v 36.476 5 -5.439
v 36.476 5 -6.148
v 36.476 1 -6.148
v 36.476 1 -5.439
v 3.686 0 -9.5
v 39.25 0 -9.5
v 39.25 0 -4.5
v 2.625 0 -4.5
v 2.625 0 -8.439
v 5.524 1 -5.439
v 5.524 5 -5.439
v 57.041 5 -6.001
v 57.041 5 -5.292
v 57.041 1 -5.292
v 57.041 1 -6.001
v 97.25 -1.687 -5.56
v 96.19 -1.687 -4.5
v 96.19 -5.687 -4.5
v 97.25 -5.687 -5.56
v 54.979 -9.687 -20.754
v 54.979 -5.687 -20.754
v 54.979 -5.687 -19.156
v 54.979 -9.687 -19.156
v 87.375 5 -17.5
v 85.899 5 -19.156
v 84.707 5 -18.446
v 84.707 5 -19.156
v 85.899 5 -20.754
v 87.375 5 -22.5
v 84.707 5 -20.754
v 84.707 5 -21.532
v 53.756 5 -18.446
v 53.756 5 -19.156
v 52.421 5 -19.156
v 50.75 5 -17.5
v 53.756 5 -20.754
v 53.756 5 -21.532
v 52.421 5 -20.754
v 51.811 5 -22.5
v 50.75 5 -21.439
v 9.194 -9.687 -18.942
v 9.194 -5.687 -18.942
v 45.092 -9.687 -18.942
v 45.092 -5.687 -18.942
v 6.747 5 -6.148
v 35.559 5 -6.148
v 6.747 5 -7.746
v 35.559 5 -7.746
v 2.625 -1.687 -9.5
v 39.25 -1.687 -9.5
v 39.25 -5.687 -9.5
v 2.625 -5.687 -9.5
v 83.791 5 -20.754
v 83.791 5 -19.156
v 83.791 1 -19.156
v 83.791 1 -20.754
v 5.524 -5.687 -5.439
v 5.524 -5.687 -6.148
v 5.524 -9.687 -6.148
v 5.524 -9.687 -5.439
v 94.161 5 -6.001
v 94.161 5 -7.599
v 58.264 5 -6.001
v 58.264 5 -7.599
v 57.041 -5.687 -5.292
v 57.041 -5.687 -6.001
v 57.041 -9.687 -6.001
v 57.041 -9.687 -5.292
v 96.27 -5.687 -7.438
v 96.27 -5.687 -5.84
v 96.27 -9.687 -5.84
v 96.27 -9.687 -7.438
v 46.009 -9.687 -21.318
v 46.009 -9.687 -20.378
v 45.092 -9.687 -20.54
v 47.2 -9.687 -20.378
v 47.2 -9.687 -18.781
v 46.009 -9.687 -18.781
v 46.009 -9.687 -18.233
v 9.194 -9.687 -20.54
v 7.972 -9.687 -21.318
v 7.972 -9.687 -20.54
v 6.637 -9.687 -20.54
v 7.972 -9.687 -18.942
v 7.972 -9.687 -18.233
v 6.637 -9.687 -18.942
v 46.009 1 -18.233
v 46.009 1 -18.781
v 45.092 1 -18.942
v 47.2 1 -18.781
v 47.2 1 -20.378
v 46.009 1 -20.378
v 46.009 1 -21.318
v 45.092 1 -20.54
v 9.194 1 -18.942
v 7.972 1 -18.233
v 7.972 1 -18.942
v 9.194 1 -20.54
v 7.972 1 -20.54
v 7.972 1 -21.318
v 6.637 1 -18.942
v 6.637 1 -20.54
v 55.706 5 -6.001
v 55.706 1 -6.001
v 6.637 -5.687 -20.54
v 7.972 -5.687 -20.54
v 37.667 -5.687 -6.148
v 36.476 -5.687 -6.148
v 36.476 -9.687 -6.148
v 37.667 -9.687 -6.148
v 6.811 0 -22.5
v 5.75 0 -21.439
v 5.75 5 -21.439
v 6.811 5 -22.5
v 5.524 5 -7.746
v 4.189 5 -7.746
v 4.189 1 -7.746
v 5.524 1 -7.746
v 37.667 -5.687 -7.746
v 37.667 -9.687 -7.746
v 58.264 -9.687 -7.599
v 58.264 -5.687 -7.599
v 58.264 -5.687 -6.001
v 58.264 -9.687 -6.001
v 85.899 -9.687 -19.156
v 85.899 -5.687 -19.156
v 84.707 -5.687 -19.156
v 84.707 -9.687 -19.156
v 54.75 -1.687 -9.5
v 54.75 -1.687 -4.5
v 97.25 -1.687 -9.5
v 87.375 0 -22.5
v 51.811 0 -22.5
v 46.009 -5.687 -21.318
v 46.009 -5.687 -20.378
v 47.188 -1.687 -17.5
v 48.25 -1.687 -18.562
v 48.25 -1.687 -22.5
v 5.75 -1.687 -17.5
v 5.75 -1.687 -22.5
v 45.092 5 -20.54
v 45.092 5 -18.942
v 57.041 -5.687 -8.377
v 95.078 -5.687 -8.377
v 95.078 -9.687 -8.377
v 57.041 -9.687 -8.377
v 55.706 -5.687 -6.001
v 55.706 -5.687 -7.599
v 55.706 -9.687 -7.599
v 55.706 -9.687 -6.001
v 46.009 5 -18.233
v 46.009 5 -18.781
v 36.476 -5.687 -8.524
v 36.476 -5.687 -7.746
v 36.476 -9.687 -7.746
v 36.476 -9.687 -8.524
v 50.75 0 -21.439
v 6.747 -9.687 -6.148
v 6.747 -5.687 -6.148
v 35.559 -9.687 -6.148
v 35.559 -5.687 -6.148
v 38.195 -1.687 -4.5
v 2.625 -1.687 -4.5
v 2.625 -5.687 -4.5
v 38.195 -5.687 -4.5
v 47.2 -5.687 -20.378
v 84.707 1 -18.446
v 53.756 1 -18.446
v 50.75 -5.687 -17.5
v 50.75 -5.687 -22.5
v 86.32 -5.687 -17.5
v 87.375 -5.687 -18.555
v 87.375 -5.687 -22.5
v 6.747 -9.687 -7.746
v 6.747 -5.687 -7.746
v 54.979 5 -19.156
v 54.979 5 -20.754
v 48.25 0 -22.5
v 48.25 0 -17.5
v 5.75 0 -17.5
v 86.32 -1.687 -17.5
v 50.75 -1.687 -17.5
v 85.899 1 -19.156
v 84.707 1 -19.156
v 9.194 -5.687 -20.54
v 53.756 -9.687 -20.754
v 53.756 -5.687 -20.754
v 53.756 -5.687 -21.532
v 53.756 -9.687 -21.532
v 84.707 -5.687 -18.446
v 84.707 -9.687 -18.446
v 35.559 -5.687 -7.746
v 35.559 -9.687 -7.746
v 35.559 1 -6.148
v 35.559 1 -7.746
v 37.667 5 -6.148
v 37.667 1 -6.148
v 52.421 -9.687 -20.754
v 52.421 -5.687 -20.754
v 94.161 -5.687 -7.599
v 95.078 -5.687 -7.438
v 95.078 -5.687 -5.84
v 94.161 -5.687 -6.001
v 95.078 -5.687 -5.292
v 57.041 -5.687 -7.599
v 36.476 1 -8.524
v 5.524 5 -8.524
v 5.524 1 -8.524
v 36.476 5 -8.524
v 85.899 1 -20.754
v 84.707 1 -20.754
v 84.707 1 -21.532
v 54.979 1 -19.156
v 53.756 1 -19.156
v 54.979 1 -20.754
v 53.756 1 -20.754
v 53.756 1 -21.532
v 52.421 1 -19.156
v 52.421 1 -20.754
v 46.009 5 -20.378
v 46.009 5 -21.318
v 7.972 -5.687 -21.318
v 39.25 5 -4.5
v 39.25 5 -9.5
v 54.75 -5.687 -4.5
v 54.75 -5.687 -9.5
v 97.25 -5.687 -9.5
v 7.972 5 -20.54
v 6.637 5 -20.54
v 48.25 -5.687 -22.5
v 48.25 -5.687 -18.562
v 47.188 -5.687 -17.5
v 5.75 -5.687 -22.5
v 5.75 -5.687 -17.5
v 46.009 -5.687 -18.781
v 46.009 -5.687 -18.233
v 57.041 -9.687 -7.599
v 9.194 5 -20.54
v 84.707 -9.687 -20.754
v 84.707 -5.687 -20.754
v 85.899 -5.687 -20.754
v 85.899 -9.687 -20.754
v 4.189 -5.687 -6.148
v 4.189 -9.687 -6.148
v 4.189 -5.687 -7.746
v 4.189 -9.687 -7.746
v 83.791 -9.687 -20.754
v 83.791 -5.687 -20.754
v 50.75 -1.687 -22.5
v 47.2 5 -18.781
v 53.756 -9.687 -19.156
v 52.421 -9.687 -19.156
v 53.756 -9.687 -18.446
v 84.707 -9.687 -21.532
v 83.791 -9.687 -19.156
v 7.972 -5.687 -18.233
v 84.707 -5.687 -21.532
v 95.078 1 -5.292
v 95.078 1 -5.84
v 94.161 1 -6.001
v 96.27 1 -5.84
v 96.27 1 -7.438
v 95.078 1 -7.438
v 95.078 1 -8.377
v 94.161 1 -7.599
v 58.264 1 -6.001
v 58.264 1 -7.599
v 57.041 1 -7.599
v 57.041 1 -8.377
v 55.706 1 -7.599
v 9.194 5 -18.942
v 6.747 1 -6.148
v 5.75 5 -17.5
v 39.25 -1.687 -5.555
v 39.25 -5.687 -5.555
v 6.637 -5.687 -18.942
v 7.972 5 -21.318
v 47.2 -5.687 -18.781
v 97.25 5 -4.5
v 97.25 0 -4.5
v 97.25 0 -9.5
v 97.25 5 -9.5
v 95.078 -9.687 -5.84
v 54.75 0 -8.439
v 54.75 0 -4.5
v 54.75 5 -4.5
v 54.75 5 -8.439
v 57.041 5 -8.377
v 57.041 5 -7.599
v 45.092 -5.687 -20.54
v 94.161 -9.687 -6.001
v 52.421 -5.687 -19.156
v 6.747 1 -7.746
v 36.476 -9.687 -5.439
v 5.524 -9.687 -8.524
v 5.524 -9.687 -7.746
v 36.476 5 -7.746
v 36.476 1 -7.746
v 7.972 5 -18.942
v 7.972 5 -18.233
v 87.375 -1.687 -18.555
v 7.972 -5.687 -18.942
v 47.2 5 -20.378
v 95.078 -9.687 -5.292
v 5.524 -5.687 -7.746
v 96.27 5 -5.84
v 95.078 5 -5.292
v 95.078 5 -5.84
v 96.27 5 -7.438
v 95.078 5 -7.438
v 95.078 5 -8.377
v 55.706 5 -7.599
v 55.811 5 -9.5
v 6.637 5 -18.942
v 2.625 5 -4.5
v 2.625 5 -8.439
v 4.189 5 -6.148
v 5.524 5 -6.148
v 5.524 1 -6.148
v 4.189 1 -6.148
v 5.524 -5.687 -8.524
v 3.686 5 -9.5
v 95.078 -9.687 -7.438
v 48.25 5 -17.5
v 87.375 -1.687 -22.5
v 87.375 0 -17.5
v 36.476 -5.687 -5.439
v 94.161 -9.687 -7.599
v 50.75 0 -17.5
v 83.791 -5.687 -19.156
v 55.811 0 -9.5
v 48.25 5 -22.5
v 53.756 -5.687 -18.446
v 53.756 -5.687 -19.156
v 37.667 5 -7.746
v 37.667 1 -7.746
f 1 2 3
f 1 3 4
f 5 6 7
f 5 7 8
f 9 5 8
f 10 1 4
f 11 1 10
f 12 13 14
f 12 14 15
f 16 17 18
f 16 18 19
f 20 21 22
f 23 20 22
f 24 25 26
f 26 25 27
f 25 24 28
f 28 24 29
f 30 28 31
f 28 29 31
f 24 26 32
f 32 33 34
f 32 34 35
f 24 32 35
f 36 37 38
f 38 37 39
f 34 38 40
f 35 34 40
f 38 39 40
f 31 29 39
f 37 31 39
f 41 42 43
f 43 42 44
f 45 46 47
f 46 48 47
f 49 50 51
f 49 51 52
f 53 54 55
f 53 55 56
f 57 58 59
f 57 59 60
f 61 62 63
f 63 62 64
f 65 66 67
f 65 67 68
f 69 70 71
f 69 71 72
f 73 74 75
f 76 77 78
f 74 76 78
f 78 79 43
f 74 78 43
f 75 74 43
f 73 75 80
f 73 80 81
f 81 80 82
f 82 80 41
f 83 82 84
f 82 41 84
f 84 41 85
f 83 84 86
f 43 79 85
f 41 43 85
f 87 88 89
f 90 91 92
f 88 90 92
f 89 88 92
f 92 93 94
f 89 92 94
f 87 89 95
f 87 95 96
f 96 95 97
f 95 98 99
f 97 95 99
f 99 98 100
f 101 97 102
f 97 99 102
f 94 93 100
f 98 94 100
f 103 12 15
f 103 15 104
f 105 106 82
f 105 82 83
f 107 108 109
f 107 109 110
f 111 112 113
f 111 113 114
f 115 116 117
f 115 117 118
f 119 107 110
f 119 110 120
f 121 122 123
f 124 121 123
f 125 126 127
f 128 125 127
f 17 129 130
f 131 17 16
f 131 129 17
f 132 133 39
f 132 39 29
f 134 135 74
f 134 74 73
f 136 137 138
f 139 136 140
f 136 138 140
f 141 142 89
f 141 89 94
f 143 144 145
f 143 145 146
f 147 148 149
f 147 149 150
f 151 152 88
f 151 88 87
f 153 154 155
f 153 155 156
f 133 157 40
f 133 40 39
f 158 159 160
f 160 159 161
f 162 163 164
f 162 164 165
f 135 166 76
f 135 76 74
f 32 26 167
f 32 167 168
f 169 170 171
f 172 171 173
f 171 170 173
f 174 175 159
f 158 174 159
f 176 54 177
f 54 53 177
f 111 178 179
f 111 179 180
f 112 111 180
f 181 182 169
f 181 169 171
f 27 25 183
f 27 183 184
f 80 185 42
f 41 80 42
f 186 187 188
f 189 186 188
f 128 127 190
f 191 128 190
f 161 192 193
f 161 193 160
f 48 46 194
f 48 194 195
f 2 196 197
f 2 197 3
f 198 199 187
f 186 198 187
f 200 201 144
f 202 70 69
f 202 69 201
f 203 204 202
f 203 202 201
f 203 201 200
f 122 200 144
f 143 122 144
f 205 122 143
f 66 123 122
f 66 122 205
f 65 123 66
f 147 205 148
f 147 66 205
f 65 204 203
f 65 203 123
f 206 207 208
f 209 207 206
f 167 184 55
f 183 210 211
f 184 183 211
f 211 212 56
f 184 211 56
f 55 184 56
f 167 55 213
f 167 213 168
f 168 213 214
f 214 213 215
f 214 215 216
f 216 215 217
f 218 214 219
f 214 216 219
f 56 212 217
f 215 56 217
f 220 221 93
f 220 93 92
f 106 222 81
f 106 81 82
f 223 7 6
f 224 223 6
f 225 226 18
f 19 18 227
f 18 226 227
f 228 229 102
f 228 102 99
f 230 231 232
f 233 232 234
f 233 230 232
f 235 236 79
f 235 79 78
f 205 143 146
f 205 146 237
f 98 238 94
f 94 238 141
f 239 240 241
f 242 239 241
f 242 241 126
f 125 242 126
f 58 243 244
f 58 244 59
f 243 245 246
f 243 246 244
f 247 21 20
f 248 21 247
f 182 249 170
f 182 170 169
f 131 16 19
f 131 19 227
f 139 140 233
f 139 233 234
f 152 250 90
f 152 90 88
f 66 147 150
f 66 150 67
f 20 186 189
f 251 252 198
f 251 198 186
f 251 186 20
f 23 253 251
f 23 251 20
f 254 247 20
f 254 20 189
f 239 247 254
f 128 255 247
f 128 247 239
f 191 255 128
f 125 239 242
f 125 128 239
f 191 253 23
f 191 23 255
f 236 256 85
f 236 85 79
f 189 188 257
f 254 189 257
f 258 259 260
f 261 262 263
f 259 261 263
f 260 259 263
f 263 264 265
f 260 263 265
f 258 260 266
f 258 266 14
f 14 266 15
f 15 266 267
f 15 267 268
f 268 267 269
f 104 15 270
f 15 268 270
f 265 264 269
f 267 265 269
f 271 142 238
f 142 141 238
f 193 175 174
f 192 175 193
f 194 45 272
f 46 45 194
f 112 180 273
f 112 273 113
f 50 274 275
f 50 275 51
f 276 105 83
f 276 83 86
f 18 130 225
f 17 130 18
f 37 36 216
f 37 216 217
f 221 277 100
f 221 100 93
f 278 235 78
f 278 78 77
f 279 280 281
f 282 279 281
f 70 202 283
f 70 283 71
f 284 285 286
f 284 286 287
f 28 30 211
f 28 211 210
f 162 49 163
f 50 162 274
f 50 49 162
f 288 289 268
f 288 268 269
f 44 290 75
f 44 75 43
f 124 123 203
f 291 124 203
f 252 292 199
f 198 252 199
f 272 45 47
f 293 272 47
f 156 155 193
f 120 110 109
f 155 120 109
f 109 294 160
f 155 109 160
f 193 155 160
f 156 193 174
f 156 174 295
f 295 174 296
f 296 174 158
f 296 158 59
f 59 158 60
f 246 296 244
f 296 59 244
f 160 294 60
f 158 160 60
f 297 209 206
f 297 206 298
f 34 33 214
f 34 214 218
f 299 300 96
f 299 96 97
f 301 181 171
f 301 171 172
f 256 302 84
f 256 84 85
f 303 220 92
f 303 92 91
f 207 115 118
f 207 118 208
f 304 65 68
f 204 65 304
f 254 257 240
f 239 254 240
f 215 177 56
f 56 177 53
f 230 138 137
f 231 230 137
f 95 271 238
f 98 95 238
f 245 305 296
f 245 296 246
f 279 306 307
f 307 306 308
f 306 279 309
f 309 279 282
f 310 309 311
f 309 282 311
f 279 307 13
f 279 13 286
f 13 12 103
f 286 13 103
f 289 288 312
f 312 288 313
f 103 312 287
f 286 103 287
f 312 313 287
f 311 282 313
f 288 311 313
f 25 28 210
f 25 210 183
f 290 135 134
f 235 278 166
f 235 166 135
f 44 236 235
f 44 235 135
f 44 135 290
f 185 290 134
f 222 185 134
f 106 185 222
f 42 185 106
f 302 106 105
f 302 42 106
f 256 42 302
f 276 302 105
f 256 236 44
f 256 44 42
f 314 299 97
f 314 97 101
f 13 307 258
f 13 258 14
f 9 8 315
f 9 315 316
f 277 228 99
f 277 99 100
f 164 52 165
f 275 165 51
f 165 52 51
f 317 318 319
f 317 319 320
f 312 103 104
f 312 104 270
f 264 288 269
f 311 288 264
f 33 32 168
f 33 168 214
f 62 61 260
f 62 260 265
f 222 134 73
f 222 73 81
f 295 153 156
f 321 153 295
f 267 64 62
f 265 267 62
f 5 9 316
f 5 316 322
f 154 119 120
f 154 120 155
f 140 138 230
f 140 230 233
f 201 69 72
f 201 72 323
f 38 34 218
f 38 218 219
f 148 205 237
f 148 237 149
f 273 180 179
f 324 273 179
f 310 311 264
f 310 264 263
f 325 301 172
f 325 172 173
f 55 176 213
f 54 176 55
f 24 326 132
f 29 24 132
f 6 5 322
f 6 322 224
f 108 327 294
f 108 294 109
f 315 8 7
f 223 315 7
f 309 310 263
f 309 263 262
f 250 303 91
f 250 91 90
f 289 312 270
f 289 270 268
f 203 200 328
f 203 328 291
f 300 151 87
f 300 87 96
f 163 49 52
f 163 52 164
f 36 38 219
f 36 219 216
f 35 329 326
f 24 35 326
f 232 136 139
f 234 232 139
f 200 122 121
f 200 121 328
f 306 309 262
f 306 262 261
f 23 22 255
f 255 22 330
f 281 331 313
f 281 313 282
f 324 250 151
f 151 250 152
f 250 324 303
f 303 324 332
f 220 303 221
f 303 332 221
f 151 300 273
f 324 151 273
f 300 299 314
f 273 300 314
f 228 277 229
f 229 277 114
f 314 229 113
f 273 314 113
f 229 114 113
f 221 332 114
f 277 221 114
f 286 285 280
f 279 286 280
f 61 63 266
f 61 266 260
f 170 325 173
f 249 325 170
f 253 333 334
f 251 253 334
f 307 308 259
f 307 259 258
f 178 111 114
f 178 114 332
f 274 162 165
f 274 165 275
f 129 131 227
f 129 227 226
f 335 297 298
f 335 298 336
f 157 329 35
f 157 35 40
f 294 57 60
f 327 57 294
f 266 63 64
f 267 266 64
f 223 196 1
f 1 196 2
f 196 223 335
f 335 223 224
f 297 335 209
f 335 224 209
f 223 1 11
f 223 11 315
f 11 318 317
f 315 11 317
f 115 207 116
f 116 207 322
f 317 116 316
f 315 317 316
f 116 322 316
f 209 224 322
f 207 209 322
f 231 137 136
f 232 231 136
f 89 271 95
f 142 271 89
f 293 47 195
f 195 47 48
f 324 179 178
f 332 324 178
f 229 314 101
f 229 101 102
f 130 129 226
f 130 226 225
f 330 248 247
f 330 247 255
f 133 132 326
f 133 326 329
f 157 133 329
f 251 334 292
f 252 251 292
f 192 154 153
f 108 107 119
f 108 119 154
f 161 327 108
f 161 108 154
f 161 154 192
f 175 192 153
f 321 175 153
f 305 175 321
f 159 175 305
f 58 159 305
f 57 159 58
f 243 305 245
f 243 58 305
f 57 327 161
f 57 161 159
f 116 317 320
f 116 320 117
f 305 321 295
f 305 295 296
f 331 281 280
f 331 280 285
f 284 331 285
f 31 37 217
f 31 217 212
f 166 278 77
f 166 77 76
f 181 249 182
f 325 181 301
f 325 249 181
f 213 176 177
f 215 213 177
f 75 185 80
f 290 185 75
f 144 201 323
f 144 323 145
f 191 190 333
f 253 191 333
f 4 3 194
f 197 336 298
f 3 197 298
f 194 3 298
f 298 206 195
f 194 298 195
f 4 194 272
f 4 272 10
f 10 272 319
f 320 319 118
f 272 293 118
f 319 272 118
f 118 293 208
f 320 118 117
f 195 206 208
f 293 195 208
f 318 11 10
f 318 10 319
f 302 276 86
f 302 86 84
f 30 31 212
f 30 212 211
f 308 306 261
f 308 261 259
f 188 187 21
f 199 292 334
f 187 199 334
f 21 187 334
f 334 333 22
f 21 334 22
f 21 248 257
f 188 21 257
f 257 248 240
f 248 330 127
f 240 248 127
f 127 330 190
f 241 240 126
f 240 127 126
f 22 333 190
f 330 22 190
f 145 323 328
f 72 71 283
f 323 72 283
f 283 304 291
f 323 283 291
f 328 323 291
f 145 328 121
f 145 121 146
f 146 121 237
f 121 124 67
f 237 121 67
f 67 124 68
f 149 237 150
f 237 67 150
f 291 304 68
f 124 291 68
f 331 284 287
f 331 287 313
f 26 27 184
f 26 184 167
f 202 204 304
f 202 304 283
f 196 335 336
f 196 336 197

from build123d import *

# Parameters (mm, degrees)
SV_DEPTH           = 5
SV_2_DEPTH         = 5
SV_3_DEPTH         = 5
SV_4_DEPTH         = 5
SKETCH3_W          = 28.811718275
SKETCH3_H          = 1.597828601
SKETCH3_W_2        = 35.897762959
SKETCH3_W_3        = 35.897762958
CUT_EXTRUDE1_DEPTH = 4
SV4_A_DEPTH        = 4
SV4_A_2_DEPTH      = 4
SV4_A_3_DEPTH      = 4
SV4_A_4_DEPTH      = 4
SKETCH7_W          = 35.897762958
SKETCH7_H          = 1.597828601
SV4_B_DEPTH        = 4
SKETCH7_W_2        = 28.811718275
SV4_B_2_DEPTH      = 4
SKETCH7_W_3        = 35.897762959
SV4_B_3_DEPTH      = 4
SV4_B_4_DEPTH      = 4


with BuildPart() as part:
    # Sketch1 → SV (new body)
    with BuildSketch(Plane(origin=(0, 0, 0), x_dir=(1, 0, 0), z_dir=(0, 1, 0))):
        Polygon((55.811, 9.5), (97.25, 9.5), (97.25, 5.56), (97.25, 4.5), (96.19, 4.5), (54.75, 4.5), (54.75, 8.439), align=None)
    extrude(amount=SV_DEPTH)


with BuildPart() as body_2:
    # Sketch1 → SV 2 (new body)
    with BuildSketch(Plane(origin=(0, 0, 0), x_dir=(1, 0, 0), z_dir=(0, 1, 0))):
        Polygon((3.686, 9.5), (39.25, 9.5), (39.25, 5.555), (39.25, 4.5), (38.195, 4.5), (2.625, 4.5), (2.625, 8.439), align=None)
    extrude(amount=SV_2_DEPTH)


with BuildPart() as body_3:
    # Sketch1 → SV 3 (new body)
    with BuildSketch(Plane(origin=(0, 0, 0), x_dir=(1, 0, 0), z_dir=(0, 1, 0))):
        Polygon((51.811, 22.5), (87.375, 22.5), (87.375, 18.555), (87.375, 17.5), (86.32, 17.5), (50.75, 17.5), (50.75, 21.439), align=None)
    extrude(amount=SV_3_DEPTH)


with BuildPart() as body_4:
    # Sketch1 → SV 4 (new body)
    with BuildSketch(Plane(origin=(0, 0, 0), x_dir=(1, 0, 0), z_dir=(0, 1, 0))):
        Polygon((6.811, 22.5), (48.25, 22.5), (48.25, 18.56), (48.25, 17.5), (47.19, 17.5), (5.75, 17.5), (5.75, 21.439), align=None)
    extrude(amount=SV_4_DEPTH)


with BuildPart() as cut_extrude1_tool:
    # Sketch3 → Cut-Extrude1 (new body)
    # profile 1 of 4: a face of its own
    with BuildSketch(Plane(origin=(0, 5, 0), x_dir=(1, 0, 0), z_dir=(0, 1, 0))):
        Polygon((4.189336253, 7.745735487), (5.524337048, 7.745735487), (5.524337048, 8.524173538), (36.475691419, 8.524173538), (36.475691419, 7.745735487), (37.666991912, 7.745735487), (37.666991912, 6.147906886), (36.475691419, 6.147906886), (36.475691419, 5.438560322), (5.524337048, 5.438560322), (5.524337048, 6.147906886), (4.189336253, 6.147906886), align=None)
        with Locations((21.152985591, 6.946821187)):
            Rectangle(SKETCH3_W, SKETCH3_H, mode=Mode.SUBTRACT)
    # profile 2 of 4: a face of its own
    with BuildSketch(Plane(origin=(0, 5, 0), x_dir=(1, 0, 0), z_dir=(0, 1, 0))):
        Polygon((52.421116037, 20.753597434), (53.756116831, 20.753597434), (53.756116831, 21.532035485), (84.707471203, 21.532035485), (84.707471203, 20.753597434), (85.898771695, 20.753597434), (85.898771695, 19.155768833), (84.707471203, 19.155768833), (84.707471203, 18.446422269), (53.756116831, 18.446422269), (53.756116831, 19.155768833), (52.421116037, 19.155768833), align=None)
        with Locations((69.384765375, 19.954683133)):
            Rectangle(SKETCH3_W, SKETCH3_H, mode=Mode.SUBTRACT)
    # profile 3 of 4: a face of its own
    with BuildSketch(Plane(origin=(0, 5, 0), x_dir=(1, 0, 0), z_dir=(0, 1, 0))):
        Polygon((55.705906871, 7.599031898), (57.040907666, 7.599031898), (57.040907666, 8.377469948), (95.07830672, 8.377469948), (95.07830672, 7.437727621), (96.269607213, 7.437727621), (96.269607213, 5.83989902), (95.07830672, 5.83989902), (95.07830672, 5.291856733), (57.040907666, 5.291856733), (57.040907666, 6.001203297), (55.705906871, 6.001203297), align=None)
        with Locations((76.21257855, 6.800117597)):
            Rectangle(SKETCH3_W_2, SKETCH3_H, mode=Mode.SUBTRACT)
    # profile 4 of 4: a face of its own
    with BuildSketch(Plane(origin=(0, 5, 0), x_dir=(1, 0, 0), z_dir=(0, 1, 0))):
        Polygon((6.636601859, 20.53972103), (7.971602653, 20.53972103), (7.971602653, 21.318159081), (46.009001708, 21.318159081), (46.009001708, 20.378416754), (47.2003022, 20.378416754), (47.2003022, 18.780588153), (46.009001708, 18.780588153), (46.009001708, 18.232545866), (7.971602653, 18.232545866), (7.971602653, 18.941892429), (6.636601859, 18.941892429), align=None)
        with Locations((27.143273538, 19.74080673)):
            Rectangle(SKETCH3_W_3, SKETCH3_H, mode=Mode.SUBTRACT)
    extrude(amount=-CUT_EXTRUDE1_DEPTH)


with BuildPart() as part_1:
    add(part.part)

    # Cut-Extrude1: cut by cut_extrude1_tool
    add(cut_extrude1_tool.part, mode=Mode.SUBTRACT)


with BuildPart() as body_2_1:
    add(body_2.part)

    # Cut-Extrude1: cut by cut_extrude1_tool
    add(cut_extrude1_tool.part, mode=Mode.SUBTRACT)


with BuildPart() as body_3_1:
    add(body_3.part)

    # Cut-Extrude1: cut by cut_extrude1_tool
    add(cut_extrude1_tool.part, mode=Mode.SUBTRACT)


with BuildPart() as body_4_1:
    add(body_4.part)

    # Cut-Extrude1: cut by cut_extrude1_tool
    add(cut_extrude1_tool.part, mode=Mode.SUBTRACT)


with BuildPart() as body_5:
    # Sketch6 → SV4(a) (new body)
    with BuildSketch(Plane(origin=(0, -1.68656, 0), x_dir=(1, 0, 0), z_dir=(0, 1, 0))):
        Polygon((2.625, 4.5), (38.195, 4.5), (39.25, 5.555), (39.25, 9.5), (3.685, 9.5), (2.625, 9.5), (2.625, 8.44), align=None)
    extrude(amount=-SV4_A_DEPTH)


with BuildPart() as body_6:
    # Sketch6 → SV4_a 2 (new body)
    with BuildSketch(Plane(origin=(0, -1.68656, 0), x_dir=(1, 0, 0), z_dir=(0, 1, 0))):
        Polygon((48.25, 18.56191605), (47.18808395, 17.5), (5.75, 17.5), (5.75, 21.44), (5.75, 22.5), (6.81, 22.5), (48.25, 22.5), align=None)
    extrude(amount=-SV4_A_2_DEPTH)


with BuildPart() as body_7:
    # Sketch6 → SV4_a 3 (new body)
    with BuildSketch(Plane(origin=(0, -1.68656, 0), x_dir=(1, 0, 0), z_dir=(0, 1, 0))):
        Polygon((54.75, 4.5), (96.19, 4.5), (97.25, 5.56), (97.25, 9.5), (55.81, 9.5), (54.75, 9.5), (54.75, 8.44), align=None)
    extrude(amount=-SV4_A_3_DEPTH)


with BuildPart() as body_8:
    # Sketch6 → SV4_a 4 (new body)
    with BuildSketch(Plane(origin=(0, -1.68656, 0), x_dir=(1, 0, 0), z_dir=(0, 1, 0))):
        Polygon((50.75, 17.5), (86.32, 17.5), (87.375, 18.555), (87.375, 22.5), (51.805, 22.5), (50.75, 22.5), (50.75, 21.445), align=None)
    extrude(amount=-SV4_A_4_DEPTH)


with BuildPart() as body_9:
    # Sketch7 → SV4(b) (new body)
    with BuildSketch(Plane.XZ.offset(5.68656)):
        Polygon((7.971602653, -21.318159081), (7.971602653, -20.53972103), (6.636601859, -20.53972103), (6.636601859, -18.941892429), (7.971602653, -18.941892429), (7.971602653, -18.232545866), (46.009001708, -18.232545866), (46.009001708, -18.780588153), (47.2003022, -18.780588153), (47.2003022, -20.378416754), (46.009001708, -20.378416754), (46.009001708, -21.318159081), align=None)
        with Locations((27.143273538, -19.74080673)):
            Rectangle(SKETCH7_W, SKETCH7_H, mode=Mode.SUBTRACT)
    extrude(amount=SV4_B_DEPTH)


with BuildPart() as body_10:
    # Sketch7 → SV4_b 2 (new body)
    with BuildSketch(Plane.XZ.offset(5.68656)):
        Polygon((53.756116831, -21.532035485), (84.707471203, -21.532035485), (84.707471203, -20.753597434), (85.898771695, -20.753597434), (85.898771695, -19.155768833), (84.707471203, -19.155768833), (84.707471203, -18.446422269), (53.756116831, -18.446422269), (53.756116831, -19.155768833), (52.421116037, -19.155768833), (52.421116037, -20.753597434), (53.756116831, -20.753597434), align=None)
        with Locations((69.384765375, -19.954683133)):
            Rectangle(SKETCH7_W_2, SKETCH7_H, mode=Mode.SUBTRACT)
    extrude(amount=SV4_B_2_DEPTH)


with BuildPart() as body_11:
    # Sketch7 → SV4_b 3 (new body)
    with BuildSketch(Plane.XZ.offset(5.68656)):
        Polygon((57.040907666, -8.377469948), (57.040907666, -7.599031898), (55.705906871, -7.599031898), (55.705906871, -6.001203297), (57.040907666, -6.001203297), (57.040907666, -5.291856733), (95.07830672, -5.291856733), (95.07830672, -5.83989902), (96.269607213, -5.83989902), (96.269607213, -7.437727621), (95.07830672, -7.437727621), (95.07830672, -8.377469948), align=None)
        with Locations((76.21257855, -6.800117597)):
            Rectangle(SKETCH7_W_3, SKETCH7_H, mode=Mode.SUBTRACT)
    extrude(amount=SV4_B_3_DEPTH)


with BuildPart() as body_12:
    # Sketch7 → SV4_b 4 (new body)
    with BuildSketch(Plane.XZ.offset(5.68656)):
        Polygon((4.189336253, -6.147906886), (5.524337048, -6.147906886), (5.524337048, -5.438560322), (36.475691419, -5.438560322), (36.475691419, -6.147906886), (37.666991912, -6.147906886), (37.666991912, -7.745735487), (36.475691419, -7.745735487), (36.475691419, -8.524173538), (5.524337048, -8.524173538), (5.524337048, -7.745735487), (4.189336253, -7.745735487), align=None)
        with Locations((21.152985591, -6.946821187)):
            Rectangle(SKETCH7_W_2, SKETCH7_H, mode=Mode.SUBTRACT)
    extrude(amount=SV4_B_4_DEPTH)


solid = Compound([part_1.part, body_2_1.part, body_3_1.part, body_4_1.part, body_5.part, body_6.part, body_7.part, body_8.part, body_9.part, body_10.part, body_11.part, body_12.part])
